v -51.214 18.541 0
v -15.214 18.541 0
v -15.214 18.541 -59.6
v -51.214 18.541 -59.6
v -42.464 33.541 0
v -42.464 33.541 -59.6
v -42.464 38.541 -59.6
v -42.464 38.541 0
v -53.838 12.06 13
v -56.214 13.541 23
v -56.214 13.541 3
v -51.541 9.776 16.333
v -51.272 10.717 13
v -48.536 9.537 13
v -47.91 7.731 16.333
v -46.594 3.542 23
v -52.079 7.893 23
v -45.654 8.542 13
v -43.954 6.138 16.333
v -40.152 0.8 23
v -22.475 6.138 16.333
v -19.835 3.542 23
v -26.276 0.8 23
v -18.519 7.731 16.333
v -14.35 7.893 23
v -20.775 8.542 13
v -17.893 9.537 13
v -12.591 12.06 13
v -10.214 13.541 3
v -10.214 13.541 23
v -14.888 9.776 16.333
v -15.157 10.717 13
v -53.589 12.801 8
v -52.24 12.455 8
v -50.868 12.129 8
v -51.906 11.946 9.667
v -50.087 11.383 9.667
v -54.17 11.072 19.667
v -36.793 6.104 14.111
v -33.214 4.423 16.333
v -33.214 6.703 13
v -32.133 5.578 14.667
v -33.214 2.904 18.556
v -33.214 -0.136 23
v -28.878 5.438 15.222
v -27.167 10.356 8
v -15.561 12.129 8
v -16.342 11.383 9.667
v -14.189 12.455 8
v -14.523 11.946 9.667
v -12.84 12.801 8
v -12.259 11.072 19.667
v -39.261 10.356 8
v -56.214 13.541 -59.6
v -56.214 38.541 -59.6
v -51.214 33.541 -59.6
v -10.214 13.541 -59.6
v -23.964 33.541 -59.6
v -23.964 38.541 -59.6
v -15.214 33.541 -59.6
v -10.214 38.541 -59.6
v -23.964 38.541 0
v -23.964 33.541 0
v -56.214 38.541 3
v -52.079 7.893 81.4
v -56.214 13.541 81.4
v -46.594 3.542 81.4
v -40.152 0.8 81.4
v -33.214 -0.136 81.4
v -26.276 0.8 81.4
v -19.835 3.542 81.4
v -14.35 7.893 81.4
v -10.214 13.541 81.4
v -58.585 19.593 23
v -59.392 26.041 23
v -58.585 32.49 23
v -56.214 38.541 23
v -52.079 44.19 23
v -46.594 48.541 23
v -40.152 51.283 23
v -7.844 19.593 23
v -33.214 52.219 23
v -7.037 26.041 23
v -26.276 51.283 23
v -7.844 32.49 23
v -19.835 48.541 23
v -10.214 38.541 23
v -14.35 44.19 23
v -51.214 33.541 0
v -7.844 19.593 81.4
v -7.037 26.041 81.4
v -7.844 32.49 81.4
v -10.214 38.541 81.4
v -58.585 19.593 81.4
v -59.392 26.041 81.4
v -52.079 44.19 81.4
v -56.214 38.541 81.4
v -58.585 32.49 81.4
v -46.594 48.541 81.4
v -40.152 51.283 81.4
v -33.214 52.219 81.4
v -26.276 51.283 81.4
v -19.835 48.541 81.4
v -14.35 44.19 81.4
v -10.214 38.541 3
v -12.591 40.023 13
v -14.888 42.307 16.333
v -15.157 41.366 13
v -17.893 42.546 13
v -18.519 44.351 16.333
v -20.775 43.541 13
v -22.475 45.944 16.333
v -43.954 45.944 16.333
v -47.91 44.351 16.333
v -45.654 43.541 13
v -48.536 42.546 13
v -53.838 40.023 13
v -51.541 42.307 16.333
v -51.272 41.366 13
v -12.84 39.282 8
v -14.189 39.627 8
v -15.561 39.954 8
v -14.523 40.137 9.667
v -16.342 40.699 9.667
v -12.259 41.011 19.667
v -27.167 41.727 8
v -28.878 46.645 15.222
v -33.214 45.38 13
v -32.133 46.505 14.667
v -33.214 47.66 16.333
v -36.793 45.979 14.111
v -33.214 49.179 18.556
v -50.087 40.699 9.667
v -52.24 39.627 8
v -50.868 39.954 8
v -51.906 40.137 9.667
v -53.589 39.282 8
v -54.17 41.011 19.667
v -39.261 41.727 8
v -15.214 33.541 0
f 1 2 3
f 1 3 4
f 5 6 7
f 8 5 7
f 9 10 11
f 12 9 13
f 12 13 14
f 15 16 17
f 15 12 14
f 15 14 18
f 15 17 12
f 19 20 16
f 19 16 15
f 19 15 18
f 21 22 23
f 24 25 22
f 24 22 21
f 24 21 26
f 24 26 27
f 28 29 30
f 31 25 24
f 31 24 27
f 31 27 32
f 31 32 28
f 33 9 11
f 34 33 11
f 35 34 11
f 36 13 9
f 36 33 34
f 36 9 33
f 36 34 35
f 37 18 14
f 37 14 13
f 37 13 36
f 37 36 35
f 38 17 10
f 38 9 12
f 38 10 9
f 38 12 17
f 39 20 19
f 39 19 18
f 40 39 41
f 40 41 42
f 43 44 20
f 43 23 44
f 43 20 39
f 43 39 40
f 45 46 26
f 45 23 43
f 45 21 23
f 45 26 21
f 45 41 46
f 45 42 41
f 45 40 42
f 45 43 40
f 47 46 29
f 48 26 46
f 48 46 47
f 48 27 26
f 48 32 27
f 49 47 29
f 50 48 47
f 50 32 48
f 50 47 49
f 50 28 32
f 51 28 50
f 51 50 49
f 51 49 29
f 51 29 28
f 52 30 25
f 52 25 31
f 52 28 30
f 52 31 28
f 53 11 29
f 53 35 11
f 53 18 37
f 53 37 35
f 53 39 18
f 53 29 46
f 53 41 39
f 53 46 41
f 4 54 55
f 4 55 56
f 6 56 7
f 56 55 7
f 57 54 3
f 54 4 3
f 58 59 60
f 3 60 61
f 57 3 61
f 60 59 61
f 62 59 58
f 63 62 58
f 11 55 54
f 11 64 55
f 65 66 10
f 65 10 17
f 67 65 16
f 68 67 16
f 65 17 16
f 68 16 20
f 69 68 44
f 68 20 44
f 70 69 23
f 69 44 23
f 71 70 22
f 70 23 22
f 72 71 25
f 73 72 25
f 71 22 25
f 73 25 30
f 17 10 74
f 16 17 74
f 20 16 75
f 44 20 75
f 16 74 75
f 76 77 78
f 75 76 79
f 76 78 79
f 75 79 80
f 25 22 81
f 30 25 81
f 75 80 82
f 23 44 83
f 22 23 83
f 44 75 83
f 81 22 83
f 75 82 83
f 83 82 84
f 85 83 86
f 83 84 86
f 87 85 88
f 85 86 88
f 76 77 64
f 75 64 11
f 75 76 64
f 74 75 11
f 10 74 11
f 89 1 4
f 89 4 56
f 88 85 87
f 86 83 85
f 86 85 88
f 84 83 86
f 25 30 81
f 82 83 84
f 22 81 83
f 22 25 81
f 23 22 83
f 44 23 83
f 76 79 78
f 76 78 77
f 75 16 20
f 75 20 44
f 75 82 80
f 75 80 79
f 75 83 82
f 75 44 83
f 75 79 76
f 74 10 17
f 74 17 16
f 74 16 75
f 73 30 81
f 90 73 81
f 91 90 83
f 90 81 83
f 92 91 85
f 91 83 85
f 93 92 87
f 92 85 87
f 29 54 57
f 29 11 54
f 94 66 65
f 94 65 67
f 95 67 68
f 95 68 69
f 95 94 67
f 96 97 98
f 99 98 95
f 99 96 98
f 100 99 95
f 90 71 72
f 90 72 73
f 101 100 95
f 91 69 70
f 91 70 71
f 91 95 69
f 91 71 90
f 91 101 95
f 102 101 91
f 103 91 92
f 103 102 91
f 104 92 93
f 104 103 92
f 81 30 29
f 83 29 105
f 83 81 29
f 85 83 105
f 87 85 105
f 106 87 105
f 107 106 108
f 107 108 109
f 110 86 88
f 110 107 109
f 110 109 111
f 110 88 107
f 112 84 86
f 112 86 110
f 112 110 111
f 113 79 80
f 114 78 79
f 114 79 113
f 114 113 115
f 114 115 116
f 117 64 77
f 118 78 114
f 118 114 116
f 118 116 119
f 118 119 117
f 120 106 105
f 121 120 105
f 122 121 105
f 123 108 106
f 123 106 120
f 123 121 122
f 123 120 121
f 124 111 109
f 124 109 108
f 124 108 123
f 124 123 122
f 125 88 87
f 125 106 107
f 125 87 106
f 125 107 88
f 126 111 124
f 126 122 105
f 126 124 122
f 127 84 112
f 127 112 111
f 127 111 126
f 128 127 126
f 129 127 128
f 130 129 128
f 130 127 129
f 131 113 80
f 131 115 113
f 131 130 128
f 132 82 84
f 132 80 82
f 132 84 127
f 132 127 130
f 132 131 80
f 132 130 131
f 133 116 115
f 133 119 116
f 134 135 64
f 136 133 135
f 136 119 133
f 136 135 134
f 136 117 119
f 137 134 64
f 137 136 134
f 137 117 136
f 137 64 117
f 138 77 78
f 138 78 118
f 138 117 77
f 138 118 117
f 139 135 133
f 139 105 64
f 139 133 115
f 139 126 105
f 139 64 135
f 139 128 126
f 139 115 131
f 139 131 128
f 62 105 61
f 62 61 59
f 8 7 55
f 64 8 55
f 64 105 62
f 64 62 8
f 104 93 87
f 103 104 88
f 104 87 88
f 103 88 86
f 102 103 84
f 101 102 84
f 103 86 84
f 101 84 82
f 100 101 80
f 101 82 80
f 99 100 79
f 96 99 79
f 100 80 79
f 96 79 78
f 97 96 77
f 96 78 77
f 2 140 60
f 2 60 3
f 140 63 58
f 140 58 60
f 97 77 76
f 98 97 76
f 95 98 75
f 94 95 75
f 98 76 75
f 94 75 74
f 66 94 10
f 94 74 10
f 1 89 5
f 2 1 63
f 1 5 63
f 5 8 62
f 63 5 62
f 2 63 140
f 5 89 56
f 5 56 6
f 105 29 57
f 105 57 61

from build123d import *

# Parameters (mm, degrees)
F0_W      = 18.5
F0_H      = 5
F1_DEPTH  = 3
F4_DEPTH  = 58.4
F1_FACE_W = 46
F1_FACE_H = 25
F6_DEPTH  = 59.6


with BuildPart() as f1:
    # F0 (on Top) → F1 (new body)
    with BuildSketch(Plane.XY):
        Polygon((-56.2144573331, 13.5414201766), (-10.2144573331, 13.5414201766), (-10.2144573331, 38.5414201766), (-23.9644573331, 38.5414201766), (-23.9644573331, 33.5414201766), (-15.2144573331, 33.5414201766), (-15.2144573331, 18.5414201766), (-51.2144573331, 18.5414201766), (-51.2144573331, 33.5414201766), (-42.4644573331, 33.5414201766), (-42.4644573331, 38.5414201766), (-56.2144573331, 38.5414201766), align=None)
        with Locations((-33.2144573331, 36.0414201766)):
            Rectangle(F0_W, F0_H)
        Polygon((-15.2144573331, 33.5414201766), (-23.9644573331, 33.5414201766), (-42.4644573331, 33.5414201766), (-51.2144573331, 33.5414201766), (-51.2144573331, 18.5414201766), (-15.2144573331, 18.5414201766), align=None)
    extrude(amount=F1_DEPTH)

    # F1_face (on face) → F5 section 0
    with BuildSketch(Plane(origin=(-33.2144573331, 26.0414201766, 3), x_dir=(1, 0, 0), z_dir=(0, 0, 1))):
        Rectangle(F1_FACE_W, F1_FACE_H)
    # F3 (on offset) → F5 section 1
    with BuildSketch(Plane.XY.offset(23)):
        with BuildLine():
            ThreePointArc((-10.2144573331, 38.5414201766), (-33.2144573331, 52.218700402), (-56.2144573331, 38.5414201766))
            ThreePointArc((-56.2144573331, 38.5414201766), (-59.3917375585, 26.0414201766), (-56.2144573331, 13.5414201766))
            ThreePointArc((-56.2144573331, 13.5414201766), (-33.2144573331, -0.1358600488), (-10.2144573331, 13.5414201766))
            ThreePointArc((-10.2144573331, 13.5414201766), (-7.0371771077, 26.0414201766), (-10.2144573331, 38.5414201766))
        make_face()
    loft()

    # F0 (on Top) → F6 (join)
    with BuildSketch(Plane.XY):
        Polygon((-56.2144573331, 13.5414201766), (-10.2144573331, 13.5414201766), (-10.2144573331, 38.5414201766), (-23.9644573331, 38.5414201766), (-23.9644573331, 33.5414201766), (-15.2144573331, 33.5414201766), (-15.2144573331, 18.5414201766), (-51.2144573331, 18.5414201766), (-51.2144573331, 33.5414201766), (-42.4644573331, 33.5414201766), (-42.4644573331, 38.5414201766), (-56.2144573331, 38.5414201766), align=None)
    extrude(amount=-F6_DEPTH)


with BuildPart() as f4:
    # F3 (on offset) → F4 (new body)
    with BuildSketch(Plane.XY.offset(23)):
        with BuildLine():
            ThreePointArc((-10.2144573331, 38.5414201766), (-33.2144573331, 52.218700402), (-56.2144573331, 38.5414201766))
            ThreePointArc((-56.2144573331, 38.5414201766), (-59.3917375585, 26.0414201766), (-56.2144573331, 13.5414201766))
            ThreePointArc((-56.2144573331, 13.5414201766), (-33.2144573331, -0.1358600488), (-10.2144573331, 13.5414201766))
            ThreePointArc((-10.2144573331, 13.5414201766), (-7.0371771077, 26.0414201766), (-10.2144573331, 38.5414201766))
        make_face()
    extrude(amount=F4_DEPTH)


solid = Compound([f1.part, f4.part])
